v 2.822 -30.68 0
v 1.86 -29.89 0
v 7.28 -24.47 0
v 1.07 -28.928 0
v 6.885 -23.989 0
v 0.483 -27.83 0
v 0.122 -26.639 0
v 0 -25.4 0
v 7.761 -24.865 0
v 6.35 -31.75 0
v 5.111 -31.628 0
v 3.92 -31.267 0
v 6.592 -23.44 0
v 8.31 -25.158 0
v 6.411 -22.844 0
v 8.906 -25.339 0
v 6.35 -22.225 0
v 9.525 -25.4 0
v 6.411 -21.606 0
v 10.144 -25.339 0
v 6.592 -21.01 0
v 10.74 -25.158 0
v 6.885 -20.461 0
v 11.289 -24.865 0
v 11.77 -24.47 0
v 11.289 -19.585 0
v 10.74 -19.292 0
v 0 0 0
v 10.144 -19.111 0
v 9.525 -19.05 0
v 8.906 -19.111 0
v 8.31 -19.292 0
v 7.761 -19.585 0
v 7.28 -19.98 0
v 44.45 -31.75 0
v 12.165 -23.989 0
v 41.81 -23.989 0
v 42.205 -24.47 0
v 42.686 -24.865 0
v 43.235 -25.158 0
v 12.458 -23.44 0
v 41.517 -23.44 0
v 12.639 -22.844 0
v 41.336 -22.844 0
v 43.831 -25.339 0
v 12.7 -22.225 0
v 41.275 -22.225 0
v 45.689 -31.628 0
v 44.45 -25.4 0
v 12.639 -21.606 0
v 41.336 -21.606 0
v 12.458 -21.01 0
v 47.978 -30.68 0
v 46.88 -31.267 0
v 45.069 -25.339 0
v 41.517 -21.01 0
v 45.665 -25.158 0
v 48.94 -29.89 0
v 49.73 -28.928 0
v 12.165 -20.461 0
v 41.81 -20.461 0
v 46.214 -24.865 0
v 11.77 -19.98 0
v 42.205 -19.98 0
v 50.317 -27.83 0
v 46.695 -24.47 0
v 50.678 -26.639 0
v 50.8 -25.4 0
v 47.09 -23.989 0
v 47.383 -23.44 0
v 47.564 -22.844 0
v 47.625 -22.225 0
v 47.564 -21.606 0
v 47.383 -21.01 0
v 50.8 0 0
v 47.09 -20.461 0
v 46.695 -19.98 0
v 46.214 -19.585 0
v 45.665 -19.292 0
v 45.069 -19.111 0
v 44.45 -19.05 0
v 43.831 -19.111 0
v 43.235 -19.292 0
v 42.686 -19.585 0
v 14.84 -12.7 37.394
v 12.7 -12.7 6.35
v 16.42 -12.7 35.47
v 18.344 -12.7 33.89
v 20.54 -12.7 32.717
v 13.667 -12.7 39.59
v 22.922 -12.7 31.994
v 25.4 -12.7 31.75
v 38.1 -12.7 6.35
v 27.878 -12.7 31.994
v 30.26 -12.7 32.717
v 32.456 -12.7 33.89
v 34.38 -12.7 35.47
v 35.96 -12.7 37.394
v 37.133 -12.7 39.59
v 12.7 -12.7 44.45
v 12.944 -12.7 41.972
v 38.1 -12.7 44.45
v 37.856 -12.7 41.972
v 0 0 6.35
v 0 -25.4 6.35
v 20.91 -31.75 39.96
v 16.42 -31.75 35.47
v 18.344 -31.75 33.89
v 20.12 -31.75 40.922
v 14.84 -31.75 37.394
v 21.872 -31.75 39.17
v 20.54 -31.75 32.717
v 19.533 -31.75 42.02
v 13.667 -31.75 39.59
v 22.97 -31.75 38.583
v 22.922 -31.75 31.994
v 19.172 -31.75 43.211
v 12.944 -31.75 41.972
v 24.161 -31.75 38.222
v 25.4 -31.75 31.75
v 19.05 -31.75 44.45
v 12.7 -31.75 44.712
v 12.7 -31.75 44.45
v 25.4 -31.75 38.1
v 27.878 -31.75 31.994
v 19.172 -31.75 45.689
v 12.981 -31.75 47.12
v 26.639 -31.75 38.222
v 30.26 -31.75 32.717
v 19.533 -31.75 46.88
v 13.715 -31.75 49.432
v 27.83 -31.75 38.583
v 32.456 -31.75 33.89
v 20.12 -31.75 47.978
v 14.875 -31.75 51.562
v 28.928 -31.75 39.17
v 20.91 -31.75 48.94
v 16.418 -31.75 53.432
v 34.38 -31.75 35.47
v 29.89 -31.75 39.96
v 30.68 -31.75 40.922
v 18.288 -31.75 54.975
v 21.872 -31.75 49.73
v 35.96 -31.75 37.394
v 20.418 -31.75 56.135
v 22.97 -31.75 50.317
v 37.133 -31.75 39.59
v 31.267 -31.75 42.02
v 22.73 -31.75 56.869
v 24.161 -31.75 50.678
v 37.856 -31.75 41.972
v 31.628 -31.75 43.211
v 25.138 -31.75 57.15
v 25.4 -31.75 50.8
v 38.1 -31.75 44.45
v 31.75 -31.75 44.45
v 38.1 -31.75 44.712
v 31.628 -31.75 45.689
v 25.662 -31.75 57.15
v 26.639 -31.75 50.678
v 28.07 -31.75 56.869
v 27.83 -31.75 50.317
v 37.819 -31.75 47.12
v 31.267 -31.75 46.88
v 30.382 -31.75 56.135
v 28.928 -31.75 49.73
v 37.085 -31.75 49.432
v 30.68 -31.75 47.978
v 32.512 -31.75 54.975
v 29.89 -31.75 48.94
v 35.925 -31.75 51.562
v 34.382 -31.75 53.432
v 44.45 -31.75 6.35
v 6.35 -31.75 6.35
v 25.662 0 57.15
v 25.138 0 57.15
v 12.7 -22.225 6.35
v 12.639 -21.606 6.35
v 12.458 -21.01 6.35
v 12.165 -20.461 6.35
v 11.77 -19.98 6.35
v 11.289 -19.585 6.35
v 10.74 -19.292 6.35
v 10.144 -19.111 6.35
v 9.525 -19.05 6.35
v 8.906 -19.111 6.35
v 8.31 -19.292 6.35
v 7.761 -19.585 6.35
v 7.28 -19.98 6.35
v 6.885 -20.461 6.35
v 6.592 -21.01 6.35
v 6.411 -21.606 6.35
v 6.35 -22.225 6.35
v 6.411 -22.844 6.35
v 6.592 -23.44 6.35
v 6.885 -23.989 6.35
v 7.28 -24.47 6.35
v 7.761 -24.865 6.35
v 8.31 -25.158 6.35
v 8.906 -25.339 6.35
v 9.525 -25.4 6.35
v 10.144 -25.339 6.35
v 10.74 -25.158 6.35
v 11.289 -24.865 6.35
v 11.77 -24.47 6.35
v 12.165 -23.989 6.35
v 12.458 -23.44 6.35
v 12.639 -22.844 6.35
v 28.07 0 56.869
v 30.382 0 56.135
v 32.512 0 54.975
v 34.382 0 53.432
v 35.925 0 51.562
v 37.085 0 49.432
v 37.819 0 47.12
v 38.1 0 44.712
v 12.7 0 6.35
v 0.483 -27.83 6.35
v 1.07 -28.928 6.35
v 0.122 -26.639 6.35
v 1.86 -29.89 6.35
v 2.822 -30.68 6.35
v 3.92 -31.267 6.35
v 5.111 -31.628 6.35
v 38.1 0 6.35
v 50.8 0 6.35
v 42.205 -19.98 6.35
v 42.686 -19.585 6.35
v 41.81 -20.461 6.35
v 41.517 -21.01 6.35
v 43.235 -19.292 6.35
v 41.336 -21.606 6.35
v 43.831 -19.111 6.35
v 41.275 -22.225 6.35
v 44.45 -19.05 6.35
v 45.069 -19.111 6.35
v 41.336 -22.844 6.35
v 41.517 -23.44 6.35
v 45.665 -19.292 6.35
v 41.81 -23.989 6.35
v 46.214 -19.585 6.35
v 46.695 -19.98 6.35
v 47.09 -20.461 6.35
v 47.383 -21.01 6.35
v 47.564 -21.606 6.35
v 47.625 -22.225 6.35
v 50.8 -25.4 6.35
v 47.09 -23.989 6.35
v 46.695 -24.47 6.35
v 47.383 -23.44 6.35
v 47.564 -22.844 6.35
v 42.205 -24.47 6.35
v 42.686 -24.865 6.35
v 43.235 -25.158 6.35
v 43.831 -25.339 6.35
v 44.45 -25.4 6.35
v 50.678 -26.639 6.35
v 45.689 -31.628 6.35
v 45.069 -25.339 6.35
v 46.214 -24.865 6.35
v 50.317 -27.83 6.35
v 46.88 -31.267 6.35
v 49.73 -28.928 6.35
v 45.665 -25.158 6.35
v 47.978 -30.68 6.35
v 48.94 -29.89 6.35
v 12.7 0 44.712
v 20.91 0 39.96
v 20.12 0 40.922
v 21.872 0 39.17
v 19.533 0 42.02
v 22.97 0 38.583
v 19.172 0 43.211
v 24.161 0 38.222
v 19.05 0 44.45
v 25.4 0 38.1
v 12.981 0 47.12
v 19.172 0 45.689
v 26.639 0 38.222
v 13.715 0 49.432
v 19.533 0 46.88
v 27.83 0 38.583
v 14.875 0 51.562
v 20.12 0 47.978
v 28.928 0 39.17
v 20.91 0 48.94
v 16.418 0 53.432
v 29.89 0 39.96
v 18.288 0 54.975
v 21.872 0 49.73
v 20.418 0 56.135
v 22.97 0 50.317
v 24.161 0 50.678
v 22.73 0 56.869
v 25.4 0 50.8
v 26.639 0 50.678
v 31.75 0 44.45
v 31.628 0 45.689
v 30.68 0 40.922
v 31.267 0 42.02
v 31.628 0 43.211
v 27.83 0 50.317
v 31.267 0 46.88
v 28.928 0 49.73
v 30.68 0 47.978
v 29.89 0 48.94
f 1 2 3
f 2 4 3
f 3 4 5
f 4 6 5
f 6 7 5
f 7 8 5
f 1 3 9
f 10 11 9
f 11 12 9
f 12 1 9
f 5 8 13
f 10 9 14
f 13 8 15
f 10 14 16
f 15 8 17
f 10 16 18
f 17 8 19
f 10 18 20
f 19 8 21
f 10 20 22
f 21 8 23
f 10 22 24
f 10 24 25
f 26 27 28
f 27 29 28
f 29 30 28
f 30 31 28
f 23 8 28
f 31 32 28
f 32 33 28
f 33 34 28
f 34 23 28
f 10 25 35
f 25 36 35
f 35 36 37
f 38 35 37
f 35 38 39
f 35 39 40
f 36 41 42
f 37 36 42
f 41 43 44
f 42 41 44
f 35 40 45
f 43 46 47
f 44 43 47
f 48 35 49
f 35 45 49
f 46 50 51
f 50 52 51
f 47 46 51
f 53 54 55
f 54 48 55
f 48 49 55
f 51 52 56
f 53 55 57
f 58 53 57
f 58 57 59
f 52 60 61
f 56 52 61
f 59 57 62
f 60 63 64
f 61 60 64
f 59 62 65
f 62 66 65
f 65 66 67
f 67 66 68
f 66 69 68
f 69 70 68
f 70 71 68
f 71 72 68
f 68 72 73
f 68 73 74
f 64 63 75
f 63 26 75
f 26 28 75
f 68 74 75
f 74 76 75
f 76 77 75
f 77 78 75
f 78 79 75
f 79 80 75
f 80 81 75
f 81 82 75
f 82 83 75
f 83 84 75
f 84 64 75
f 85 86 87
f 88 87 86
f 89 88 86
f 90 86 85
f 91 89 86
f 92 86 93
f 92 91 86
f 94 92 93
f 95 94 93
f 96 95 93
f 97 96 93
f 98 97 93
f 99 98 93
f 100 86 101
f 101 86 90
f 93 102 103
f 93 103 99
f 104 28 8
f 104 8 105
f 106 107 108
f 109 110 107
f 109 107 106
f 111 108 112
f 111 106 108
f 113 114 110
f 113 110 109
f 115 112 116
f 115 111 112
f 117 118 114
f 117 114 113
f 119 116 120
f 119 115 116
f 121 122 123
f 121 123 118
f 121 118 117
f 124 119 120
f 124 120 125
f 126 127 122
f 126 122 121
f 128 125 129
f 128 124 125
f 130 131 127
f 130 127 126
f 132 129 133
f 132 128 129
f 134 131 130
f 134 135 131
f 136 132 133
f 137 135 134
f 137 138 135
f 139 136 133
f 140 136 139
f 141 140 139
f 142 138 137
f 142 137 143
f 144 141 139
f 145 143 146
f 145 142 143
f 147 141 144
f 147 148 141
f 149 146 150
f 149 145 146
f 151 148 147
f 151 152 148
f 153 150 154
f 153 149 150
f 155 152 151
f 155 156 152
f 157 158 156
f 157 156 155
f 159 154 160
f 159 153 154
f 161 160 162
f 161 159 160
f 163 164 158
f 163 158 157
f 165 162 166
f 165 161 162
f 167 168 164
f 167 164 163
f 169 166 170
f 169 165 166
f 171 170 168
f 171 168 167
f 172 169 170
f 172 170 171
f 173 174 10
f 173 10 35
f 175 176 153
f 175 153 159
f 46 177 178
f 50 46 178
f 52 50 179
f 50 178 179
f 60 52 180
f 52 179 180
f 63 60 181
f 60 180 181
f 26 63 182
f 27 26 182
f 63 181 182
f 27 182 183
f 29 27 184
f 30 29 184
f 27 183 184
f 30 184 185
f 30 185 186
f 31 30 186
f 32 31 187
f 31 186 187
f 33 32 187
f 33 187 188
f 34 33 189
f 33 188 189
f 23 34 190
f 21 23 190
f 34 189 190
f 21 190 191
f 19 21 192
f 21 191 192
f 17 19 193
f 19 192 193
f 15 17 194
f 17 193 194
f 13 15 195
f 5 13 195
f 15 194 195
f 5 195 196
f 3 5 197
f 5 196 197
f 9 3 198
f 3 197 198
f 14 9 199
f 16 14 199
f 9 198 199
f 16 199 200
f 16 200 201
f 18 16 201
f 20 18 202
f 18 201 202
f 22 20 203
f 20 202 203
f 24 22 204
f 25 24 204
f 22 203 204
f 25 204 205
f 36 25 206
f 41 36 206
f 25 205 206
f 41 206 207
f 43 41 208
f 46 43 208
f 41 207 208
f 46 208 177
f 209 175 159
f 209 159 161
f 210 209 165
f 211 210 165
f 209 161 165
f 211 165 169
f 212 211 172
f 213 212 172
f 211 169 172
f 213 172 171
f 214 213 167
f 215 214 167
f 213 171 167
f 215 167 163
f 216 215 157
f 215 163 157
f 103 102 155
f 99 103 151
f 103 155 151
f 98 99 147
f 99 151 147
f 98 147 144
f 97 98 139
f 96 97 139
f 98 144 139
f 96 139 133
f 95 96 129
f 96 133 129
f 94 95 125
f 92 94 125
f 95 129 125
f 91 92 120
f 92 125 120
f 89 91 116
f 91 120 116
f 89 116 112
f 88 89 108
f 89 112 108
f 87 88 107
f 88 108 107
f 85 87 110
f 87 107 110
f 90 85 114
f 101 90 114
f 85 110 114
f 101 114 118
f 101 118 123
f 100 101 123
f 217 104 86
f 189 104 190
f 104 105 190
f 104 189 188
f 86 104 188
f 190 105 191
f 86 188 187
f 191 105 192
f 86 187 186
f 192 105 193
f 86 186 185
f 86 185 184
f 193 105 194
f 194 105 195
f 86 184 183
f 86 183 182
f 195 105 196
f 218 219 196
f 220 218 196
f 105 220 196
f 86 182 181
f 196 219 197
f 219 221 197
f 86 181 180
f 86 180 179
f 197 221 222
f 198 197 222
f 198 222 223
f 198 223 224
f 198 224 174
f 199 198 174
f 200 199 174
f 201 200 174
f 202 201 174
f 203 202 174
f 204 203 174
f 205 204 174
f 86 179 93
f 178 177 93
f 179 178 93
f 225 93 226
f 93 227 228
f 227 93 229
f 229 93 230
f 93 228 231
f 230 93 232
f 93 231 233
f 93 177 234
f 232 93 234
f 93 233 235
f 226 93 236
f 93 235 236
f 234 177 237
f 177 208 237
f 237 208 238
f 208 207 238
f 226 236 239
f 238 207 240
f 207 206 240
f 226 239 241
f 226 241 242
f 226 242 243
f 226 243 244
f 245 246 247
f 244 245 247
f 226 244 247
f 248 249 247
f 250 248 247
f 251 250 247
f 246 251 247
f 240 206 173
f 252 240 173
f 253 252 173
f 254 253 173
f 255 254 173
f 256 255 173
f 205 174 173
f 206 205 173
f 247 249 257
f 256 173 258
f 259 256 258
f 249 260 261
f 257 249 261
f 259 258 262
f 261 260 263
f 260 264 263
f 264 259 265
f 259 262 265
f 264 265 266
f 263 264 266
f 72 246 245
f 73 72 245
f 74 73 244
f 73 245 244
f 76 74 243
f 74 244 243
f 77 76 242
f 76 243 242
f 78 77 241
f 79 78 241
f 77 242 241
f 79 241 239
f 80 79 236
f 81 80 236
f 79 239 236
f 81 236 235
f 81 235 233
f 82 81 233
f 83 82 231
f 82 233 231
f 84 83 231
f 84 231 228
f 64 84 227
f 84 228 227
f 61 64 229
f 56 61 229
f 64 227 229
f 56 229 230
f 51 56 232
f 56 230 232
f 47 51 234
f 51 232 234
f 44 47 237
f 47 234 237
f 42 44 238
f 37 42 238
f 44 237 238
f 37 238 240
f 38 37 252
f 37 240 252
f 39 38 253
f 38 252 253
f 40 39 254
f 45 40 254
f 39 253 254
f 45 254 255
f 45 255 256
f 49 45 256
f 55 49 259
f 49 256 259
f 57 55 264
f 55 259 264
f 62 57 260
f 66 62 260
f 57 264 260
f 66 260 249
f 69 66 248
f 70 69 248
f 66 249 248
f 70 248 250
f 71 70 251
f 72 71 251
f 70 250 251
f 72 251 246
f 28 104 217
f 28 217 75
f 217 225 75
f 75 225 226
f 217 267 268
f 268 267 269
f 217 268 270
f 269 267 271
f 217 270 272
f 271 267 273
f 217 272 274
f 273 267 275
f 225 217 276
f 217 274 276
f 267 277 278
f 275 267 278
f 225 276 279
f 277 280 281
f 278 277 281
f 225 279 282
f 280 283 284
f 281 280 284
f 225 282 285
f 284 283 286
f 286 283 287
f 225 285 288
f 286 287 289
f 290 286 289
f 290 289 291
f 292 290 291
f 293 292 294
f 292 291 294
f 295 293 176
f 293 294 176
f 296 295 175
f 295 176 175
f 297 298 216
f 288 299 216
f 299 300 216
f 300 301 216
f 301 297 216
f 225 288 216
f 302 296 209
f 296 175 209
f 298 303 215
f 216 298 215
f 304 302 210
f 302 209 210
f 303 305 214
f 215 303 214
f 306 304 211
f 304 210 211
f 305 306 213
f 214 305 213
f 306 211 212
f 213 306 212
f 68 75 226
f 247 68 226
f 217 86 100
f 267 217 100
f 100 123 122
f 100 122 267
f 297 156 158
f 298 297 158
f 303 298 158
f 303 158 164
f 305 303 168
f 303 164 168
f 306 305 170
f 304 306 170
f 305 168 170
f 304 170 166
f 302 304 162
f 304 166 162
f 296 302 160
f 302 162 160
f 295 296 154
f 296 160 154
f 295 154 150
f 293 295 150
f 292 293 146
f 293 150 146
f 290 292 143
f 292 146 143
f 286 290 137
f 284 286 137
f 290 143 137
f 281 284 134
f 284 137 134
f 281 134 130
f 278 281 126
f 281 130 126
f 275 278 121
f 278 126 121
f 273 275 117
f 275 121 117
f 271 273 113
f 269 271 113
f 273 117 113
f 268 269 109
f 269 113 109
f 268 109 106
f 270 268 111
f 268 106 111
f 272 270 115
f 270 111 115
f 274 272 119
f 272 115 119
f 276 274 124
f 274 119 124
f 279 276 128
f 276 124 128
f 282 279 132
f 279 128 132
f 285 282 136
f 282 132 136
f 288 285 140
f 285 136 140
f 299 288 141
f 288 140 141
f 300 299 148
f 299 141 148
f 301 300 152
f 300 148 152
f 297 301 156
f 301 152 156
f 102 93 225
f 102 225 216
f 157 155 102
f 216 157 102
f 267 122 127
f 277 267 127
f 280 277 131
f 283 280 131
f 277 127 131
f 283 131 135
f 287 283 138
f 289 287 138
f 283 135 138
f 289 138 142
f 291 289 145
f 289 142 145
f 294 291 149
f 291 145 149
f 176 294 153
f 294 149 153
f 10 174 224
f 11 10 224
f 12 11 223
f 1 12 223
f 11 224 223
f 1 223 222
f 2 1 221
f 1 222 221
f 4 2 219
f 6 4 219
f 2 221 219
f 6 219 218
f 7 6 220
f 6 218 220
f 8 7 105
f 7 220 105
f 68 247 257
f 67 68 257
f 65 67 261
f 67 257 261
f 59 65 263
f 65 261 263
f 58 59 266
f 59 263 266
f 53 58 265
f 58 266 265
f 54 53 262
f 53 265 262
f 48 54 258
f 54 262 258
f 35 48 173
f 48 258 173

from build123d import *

# Parameters (mm, degrees)
F0_W      = 50.8
F0_H      = 57.15
F1_DEPTH  = 31.75
F2_W      = 12.7
F2_H      = 50.8
F3_DEPTH  = 31.75
F5_DEPTH  = 19.05
F7_DEPTH  = 31.75
F8_R      = 3.175
F9_DEPTH  = 6.35
F10_R     = 6.35
F11_DEPTH = 31.75


with BuildPart() as f1:
    # F0 (on Front) → F1 (new body)
    with BuildSketch(Plane.XZ):
        with Locations((25.4, 28.575)):
            Rectangle(F0_W, F0_H)
    extrude(amount=F1_DEPTH)

    # F2 (on face) → F3 (cut)
    with BuildSketch(Plane.XZ.offset(31.75)):
        with Locations((6.35, 31.75)):
            Rectangle(F2_W, F2_H)
        with Locations((44.45, 31.75)):
            Rectangle(F2_W, F2_H)
    extrude(amount=-F3_DEPTH, mode=Mode.SUBTRACT)

    # F4 (on face) → F5 (cut)
    with BuildSketch(Plane.XZ.offset(31.75)):
        with BuildLine():
            Line((12.7, 44.45), (12.7, 6.35))
            Line((12.7, 6.35), (38.1, 6.35))
            Line((38.1, 6.35), (38.1, 44.45))
            ThreePointArc((38.1, 44.45), (25.4, 31.75), (12.7, 44.45))
        make_face()
    extrude(amount=-F5_DEPTH, mode=Mode.SUBTRACT)

    # F6 (on face) → F7 (cut)
    with BuildSketch(Plane.XZ.offset(31.75)):
        with BuildLine():
            Line((12.7, 57.15), (12.7, 44.7116427085))
            ThreePointArc((12.7, 44.7116427085), (16.4178383196, 53.4321616804), (25.1383572915, 57.15))
            Line((25.1383572915, 57.15), (12.7, 57.15))
        make_face()
        with BuildLine():
            ThreePointArc((25.6616427085, 57.15), (34.3821616804, 53.4321616804), (38.1, 44.7116427085))
            Line((38.1, 44.7116427085), (38.1, 57.15))
            Line((38.1, 57.15), (25.6616427085, 57.15))
        make_face()
    extrude(amount=-F7_DEPTH, mode=Mode.SUBTRACT)

    # F8 (on face) → F9 (cut)
    with BuildSketch(Plane.XY.offset(6.35)):
        with Locations((9.525, -22.225)):
            Circle(F8_R)
        with BuildLine():
            ThreePointArc((6.35, -31.75), (1.8598719395, -29.8901280605), (0, -25.4))
            Line((0, -25.4), (0, -31.75))
            Line((0, -31.75), (6.35, -31.75))
        make_face()
        with Locations((44.45, -22.225)):
            Circle(F8_R)
        with BuildLine():
            ThreePointArc((50.8, -25.4), (48.9401280605, -29.8901280605), (44.45, -31.75))
            Line((44.45, -31.75), (50.8, -31.75))
            Line((50.8, -31.75), (50.8, -25.4))
        make_face()
    extrude(amount=-F9_DEPTH, mode=Mode.SUBTRACT)

    # F10 (on face) → F11 (cut)
    with BuildSketch(Plane.XZ.offset(31.75)):
        with Locations((25.4, 44.45)):
            Circle(F10_R)
    extrude(amount=-F11_DEPTH, mode=Mode.SUBTRACT)


solid = f1.part
